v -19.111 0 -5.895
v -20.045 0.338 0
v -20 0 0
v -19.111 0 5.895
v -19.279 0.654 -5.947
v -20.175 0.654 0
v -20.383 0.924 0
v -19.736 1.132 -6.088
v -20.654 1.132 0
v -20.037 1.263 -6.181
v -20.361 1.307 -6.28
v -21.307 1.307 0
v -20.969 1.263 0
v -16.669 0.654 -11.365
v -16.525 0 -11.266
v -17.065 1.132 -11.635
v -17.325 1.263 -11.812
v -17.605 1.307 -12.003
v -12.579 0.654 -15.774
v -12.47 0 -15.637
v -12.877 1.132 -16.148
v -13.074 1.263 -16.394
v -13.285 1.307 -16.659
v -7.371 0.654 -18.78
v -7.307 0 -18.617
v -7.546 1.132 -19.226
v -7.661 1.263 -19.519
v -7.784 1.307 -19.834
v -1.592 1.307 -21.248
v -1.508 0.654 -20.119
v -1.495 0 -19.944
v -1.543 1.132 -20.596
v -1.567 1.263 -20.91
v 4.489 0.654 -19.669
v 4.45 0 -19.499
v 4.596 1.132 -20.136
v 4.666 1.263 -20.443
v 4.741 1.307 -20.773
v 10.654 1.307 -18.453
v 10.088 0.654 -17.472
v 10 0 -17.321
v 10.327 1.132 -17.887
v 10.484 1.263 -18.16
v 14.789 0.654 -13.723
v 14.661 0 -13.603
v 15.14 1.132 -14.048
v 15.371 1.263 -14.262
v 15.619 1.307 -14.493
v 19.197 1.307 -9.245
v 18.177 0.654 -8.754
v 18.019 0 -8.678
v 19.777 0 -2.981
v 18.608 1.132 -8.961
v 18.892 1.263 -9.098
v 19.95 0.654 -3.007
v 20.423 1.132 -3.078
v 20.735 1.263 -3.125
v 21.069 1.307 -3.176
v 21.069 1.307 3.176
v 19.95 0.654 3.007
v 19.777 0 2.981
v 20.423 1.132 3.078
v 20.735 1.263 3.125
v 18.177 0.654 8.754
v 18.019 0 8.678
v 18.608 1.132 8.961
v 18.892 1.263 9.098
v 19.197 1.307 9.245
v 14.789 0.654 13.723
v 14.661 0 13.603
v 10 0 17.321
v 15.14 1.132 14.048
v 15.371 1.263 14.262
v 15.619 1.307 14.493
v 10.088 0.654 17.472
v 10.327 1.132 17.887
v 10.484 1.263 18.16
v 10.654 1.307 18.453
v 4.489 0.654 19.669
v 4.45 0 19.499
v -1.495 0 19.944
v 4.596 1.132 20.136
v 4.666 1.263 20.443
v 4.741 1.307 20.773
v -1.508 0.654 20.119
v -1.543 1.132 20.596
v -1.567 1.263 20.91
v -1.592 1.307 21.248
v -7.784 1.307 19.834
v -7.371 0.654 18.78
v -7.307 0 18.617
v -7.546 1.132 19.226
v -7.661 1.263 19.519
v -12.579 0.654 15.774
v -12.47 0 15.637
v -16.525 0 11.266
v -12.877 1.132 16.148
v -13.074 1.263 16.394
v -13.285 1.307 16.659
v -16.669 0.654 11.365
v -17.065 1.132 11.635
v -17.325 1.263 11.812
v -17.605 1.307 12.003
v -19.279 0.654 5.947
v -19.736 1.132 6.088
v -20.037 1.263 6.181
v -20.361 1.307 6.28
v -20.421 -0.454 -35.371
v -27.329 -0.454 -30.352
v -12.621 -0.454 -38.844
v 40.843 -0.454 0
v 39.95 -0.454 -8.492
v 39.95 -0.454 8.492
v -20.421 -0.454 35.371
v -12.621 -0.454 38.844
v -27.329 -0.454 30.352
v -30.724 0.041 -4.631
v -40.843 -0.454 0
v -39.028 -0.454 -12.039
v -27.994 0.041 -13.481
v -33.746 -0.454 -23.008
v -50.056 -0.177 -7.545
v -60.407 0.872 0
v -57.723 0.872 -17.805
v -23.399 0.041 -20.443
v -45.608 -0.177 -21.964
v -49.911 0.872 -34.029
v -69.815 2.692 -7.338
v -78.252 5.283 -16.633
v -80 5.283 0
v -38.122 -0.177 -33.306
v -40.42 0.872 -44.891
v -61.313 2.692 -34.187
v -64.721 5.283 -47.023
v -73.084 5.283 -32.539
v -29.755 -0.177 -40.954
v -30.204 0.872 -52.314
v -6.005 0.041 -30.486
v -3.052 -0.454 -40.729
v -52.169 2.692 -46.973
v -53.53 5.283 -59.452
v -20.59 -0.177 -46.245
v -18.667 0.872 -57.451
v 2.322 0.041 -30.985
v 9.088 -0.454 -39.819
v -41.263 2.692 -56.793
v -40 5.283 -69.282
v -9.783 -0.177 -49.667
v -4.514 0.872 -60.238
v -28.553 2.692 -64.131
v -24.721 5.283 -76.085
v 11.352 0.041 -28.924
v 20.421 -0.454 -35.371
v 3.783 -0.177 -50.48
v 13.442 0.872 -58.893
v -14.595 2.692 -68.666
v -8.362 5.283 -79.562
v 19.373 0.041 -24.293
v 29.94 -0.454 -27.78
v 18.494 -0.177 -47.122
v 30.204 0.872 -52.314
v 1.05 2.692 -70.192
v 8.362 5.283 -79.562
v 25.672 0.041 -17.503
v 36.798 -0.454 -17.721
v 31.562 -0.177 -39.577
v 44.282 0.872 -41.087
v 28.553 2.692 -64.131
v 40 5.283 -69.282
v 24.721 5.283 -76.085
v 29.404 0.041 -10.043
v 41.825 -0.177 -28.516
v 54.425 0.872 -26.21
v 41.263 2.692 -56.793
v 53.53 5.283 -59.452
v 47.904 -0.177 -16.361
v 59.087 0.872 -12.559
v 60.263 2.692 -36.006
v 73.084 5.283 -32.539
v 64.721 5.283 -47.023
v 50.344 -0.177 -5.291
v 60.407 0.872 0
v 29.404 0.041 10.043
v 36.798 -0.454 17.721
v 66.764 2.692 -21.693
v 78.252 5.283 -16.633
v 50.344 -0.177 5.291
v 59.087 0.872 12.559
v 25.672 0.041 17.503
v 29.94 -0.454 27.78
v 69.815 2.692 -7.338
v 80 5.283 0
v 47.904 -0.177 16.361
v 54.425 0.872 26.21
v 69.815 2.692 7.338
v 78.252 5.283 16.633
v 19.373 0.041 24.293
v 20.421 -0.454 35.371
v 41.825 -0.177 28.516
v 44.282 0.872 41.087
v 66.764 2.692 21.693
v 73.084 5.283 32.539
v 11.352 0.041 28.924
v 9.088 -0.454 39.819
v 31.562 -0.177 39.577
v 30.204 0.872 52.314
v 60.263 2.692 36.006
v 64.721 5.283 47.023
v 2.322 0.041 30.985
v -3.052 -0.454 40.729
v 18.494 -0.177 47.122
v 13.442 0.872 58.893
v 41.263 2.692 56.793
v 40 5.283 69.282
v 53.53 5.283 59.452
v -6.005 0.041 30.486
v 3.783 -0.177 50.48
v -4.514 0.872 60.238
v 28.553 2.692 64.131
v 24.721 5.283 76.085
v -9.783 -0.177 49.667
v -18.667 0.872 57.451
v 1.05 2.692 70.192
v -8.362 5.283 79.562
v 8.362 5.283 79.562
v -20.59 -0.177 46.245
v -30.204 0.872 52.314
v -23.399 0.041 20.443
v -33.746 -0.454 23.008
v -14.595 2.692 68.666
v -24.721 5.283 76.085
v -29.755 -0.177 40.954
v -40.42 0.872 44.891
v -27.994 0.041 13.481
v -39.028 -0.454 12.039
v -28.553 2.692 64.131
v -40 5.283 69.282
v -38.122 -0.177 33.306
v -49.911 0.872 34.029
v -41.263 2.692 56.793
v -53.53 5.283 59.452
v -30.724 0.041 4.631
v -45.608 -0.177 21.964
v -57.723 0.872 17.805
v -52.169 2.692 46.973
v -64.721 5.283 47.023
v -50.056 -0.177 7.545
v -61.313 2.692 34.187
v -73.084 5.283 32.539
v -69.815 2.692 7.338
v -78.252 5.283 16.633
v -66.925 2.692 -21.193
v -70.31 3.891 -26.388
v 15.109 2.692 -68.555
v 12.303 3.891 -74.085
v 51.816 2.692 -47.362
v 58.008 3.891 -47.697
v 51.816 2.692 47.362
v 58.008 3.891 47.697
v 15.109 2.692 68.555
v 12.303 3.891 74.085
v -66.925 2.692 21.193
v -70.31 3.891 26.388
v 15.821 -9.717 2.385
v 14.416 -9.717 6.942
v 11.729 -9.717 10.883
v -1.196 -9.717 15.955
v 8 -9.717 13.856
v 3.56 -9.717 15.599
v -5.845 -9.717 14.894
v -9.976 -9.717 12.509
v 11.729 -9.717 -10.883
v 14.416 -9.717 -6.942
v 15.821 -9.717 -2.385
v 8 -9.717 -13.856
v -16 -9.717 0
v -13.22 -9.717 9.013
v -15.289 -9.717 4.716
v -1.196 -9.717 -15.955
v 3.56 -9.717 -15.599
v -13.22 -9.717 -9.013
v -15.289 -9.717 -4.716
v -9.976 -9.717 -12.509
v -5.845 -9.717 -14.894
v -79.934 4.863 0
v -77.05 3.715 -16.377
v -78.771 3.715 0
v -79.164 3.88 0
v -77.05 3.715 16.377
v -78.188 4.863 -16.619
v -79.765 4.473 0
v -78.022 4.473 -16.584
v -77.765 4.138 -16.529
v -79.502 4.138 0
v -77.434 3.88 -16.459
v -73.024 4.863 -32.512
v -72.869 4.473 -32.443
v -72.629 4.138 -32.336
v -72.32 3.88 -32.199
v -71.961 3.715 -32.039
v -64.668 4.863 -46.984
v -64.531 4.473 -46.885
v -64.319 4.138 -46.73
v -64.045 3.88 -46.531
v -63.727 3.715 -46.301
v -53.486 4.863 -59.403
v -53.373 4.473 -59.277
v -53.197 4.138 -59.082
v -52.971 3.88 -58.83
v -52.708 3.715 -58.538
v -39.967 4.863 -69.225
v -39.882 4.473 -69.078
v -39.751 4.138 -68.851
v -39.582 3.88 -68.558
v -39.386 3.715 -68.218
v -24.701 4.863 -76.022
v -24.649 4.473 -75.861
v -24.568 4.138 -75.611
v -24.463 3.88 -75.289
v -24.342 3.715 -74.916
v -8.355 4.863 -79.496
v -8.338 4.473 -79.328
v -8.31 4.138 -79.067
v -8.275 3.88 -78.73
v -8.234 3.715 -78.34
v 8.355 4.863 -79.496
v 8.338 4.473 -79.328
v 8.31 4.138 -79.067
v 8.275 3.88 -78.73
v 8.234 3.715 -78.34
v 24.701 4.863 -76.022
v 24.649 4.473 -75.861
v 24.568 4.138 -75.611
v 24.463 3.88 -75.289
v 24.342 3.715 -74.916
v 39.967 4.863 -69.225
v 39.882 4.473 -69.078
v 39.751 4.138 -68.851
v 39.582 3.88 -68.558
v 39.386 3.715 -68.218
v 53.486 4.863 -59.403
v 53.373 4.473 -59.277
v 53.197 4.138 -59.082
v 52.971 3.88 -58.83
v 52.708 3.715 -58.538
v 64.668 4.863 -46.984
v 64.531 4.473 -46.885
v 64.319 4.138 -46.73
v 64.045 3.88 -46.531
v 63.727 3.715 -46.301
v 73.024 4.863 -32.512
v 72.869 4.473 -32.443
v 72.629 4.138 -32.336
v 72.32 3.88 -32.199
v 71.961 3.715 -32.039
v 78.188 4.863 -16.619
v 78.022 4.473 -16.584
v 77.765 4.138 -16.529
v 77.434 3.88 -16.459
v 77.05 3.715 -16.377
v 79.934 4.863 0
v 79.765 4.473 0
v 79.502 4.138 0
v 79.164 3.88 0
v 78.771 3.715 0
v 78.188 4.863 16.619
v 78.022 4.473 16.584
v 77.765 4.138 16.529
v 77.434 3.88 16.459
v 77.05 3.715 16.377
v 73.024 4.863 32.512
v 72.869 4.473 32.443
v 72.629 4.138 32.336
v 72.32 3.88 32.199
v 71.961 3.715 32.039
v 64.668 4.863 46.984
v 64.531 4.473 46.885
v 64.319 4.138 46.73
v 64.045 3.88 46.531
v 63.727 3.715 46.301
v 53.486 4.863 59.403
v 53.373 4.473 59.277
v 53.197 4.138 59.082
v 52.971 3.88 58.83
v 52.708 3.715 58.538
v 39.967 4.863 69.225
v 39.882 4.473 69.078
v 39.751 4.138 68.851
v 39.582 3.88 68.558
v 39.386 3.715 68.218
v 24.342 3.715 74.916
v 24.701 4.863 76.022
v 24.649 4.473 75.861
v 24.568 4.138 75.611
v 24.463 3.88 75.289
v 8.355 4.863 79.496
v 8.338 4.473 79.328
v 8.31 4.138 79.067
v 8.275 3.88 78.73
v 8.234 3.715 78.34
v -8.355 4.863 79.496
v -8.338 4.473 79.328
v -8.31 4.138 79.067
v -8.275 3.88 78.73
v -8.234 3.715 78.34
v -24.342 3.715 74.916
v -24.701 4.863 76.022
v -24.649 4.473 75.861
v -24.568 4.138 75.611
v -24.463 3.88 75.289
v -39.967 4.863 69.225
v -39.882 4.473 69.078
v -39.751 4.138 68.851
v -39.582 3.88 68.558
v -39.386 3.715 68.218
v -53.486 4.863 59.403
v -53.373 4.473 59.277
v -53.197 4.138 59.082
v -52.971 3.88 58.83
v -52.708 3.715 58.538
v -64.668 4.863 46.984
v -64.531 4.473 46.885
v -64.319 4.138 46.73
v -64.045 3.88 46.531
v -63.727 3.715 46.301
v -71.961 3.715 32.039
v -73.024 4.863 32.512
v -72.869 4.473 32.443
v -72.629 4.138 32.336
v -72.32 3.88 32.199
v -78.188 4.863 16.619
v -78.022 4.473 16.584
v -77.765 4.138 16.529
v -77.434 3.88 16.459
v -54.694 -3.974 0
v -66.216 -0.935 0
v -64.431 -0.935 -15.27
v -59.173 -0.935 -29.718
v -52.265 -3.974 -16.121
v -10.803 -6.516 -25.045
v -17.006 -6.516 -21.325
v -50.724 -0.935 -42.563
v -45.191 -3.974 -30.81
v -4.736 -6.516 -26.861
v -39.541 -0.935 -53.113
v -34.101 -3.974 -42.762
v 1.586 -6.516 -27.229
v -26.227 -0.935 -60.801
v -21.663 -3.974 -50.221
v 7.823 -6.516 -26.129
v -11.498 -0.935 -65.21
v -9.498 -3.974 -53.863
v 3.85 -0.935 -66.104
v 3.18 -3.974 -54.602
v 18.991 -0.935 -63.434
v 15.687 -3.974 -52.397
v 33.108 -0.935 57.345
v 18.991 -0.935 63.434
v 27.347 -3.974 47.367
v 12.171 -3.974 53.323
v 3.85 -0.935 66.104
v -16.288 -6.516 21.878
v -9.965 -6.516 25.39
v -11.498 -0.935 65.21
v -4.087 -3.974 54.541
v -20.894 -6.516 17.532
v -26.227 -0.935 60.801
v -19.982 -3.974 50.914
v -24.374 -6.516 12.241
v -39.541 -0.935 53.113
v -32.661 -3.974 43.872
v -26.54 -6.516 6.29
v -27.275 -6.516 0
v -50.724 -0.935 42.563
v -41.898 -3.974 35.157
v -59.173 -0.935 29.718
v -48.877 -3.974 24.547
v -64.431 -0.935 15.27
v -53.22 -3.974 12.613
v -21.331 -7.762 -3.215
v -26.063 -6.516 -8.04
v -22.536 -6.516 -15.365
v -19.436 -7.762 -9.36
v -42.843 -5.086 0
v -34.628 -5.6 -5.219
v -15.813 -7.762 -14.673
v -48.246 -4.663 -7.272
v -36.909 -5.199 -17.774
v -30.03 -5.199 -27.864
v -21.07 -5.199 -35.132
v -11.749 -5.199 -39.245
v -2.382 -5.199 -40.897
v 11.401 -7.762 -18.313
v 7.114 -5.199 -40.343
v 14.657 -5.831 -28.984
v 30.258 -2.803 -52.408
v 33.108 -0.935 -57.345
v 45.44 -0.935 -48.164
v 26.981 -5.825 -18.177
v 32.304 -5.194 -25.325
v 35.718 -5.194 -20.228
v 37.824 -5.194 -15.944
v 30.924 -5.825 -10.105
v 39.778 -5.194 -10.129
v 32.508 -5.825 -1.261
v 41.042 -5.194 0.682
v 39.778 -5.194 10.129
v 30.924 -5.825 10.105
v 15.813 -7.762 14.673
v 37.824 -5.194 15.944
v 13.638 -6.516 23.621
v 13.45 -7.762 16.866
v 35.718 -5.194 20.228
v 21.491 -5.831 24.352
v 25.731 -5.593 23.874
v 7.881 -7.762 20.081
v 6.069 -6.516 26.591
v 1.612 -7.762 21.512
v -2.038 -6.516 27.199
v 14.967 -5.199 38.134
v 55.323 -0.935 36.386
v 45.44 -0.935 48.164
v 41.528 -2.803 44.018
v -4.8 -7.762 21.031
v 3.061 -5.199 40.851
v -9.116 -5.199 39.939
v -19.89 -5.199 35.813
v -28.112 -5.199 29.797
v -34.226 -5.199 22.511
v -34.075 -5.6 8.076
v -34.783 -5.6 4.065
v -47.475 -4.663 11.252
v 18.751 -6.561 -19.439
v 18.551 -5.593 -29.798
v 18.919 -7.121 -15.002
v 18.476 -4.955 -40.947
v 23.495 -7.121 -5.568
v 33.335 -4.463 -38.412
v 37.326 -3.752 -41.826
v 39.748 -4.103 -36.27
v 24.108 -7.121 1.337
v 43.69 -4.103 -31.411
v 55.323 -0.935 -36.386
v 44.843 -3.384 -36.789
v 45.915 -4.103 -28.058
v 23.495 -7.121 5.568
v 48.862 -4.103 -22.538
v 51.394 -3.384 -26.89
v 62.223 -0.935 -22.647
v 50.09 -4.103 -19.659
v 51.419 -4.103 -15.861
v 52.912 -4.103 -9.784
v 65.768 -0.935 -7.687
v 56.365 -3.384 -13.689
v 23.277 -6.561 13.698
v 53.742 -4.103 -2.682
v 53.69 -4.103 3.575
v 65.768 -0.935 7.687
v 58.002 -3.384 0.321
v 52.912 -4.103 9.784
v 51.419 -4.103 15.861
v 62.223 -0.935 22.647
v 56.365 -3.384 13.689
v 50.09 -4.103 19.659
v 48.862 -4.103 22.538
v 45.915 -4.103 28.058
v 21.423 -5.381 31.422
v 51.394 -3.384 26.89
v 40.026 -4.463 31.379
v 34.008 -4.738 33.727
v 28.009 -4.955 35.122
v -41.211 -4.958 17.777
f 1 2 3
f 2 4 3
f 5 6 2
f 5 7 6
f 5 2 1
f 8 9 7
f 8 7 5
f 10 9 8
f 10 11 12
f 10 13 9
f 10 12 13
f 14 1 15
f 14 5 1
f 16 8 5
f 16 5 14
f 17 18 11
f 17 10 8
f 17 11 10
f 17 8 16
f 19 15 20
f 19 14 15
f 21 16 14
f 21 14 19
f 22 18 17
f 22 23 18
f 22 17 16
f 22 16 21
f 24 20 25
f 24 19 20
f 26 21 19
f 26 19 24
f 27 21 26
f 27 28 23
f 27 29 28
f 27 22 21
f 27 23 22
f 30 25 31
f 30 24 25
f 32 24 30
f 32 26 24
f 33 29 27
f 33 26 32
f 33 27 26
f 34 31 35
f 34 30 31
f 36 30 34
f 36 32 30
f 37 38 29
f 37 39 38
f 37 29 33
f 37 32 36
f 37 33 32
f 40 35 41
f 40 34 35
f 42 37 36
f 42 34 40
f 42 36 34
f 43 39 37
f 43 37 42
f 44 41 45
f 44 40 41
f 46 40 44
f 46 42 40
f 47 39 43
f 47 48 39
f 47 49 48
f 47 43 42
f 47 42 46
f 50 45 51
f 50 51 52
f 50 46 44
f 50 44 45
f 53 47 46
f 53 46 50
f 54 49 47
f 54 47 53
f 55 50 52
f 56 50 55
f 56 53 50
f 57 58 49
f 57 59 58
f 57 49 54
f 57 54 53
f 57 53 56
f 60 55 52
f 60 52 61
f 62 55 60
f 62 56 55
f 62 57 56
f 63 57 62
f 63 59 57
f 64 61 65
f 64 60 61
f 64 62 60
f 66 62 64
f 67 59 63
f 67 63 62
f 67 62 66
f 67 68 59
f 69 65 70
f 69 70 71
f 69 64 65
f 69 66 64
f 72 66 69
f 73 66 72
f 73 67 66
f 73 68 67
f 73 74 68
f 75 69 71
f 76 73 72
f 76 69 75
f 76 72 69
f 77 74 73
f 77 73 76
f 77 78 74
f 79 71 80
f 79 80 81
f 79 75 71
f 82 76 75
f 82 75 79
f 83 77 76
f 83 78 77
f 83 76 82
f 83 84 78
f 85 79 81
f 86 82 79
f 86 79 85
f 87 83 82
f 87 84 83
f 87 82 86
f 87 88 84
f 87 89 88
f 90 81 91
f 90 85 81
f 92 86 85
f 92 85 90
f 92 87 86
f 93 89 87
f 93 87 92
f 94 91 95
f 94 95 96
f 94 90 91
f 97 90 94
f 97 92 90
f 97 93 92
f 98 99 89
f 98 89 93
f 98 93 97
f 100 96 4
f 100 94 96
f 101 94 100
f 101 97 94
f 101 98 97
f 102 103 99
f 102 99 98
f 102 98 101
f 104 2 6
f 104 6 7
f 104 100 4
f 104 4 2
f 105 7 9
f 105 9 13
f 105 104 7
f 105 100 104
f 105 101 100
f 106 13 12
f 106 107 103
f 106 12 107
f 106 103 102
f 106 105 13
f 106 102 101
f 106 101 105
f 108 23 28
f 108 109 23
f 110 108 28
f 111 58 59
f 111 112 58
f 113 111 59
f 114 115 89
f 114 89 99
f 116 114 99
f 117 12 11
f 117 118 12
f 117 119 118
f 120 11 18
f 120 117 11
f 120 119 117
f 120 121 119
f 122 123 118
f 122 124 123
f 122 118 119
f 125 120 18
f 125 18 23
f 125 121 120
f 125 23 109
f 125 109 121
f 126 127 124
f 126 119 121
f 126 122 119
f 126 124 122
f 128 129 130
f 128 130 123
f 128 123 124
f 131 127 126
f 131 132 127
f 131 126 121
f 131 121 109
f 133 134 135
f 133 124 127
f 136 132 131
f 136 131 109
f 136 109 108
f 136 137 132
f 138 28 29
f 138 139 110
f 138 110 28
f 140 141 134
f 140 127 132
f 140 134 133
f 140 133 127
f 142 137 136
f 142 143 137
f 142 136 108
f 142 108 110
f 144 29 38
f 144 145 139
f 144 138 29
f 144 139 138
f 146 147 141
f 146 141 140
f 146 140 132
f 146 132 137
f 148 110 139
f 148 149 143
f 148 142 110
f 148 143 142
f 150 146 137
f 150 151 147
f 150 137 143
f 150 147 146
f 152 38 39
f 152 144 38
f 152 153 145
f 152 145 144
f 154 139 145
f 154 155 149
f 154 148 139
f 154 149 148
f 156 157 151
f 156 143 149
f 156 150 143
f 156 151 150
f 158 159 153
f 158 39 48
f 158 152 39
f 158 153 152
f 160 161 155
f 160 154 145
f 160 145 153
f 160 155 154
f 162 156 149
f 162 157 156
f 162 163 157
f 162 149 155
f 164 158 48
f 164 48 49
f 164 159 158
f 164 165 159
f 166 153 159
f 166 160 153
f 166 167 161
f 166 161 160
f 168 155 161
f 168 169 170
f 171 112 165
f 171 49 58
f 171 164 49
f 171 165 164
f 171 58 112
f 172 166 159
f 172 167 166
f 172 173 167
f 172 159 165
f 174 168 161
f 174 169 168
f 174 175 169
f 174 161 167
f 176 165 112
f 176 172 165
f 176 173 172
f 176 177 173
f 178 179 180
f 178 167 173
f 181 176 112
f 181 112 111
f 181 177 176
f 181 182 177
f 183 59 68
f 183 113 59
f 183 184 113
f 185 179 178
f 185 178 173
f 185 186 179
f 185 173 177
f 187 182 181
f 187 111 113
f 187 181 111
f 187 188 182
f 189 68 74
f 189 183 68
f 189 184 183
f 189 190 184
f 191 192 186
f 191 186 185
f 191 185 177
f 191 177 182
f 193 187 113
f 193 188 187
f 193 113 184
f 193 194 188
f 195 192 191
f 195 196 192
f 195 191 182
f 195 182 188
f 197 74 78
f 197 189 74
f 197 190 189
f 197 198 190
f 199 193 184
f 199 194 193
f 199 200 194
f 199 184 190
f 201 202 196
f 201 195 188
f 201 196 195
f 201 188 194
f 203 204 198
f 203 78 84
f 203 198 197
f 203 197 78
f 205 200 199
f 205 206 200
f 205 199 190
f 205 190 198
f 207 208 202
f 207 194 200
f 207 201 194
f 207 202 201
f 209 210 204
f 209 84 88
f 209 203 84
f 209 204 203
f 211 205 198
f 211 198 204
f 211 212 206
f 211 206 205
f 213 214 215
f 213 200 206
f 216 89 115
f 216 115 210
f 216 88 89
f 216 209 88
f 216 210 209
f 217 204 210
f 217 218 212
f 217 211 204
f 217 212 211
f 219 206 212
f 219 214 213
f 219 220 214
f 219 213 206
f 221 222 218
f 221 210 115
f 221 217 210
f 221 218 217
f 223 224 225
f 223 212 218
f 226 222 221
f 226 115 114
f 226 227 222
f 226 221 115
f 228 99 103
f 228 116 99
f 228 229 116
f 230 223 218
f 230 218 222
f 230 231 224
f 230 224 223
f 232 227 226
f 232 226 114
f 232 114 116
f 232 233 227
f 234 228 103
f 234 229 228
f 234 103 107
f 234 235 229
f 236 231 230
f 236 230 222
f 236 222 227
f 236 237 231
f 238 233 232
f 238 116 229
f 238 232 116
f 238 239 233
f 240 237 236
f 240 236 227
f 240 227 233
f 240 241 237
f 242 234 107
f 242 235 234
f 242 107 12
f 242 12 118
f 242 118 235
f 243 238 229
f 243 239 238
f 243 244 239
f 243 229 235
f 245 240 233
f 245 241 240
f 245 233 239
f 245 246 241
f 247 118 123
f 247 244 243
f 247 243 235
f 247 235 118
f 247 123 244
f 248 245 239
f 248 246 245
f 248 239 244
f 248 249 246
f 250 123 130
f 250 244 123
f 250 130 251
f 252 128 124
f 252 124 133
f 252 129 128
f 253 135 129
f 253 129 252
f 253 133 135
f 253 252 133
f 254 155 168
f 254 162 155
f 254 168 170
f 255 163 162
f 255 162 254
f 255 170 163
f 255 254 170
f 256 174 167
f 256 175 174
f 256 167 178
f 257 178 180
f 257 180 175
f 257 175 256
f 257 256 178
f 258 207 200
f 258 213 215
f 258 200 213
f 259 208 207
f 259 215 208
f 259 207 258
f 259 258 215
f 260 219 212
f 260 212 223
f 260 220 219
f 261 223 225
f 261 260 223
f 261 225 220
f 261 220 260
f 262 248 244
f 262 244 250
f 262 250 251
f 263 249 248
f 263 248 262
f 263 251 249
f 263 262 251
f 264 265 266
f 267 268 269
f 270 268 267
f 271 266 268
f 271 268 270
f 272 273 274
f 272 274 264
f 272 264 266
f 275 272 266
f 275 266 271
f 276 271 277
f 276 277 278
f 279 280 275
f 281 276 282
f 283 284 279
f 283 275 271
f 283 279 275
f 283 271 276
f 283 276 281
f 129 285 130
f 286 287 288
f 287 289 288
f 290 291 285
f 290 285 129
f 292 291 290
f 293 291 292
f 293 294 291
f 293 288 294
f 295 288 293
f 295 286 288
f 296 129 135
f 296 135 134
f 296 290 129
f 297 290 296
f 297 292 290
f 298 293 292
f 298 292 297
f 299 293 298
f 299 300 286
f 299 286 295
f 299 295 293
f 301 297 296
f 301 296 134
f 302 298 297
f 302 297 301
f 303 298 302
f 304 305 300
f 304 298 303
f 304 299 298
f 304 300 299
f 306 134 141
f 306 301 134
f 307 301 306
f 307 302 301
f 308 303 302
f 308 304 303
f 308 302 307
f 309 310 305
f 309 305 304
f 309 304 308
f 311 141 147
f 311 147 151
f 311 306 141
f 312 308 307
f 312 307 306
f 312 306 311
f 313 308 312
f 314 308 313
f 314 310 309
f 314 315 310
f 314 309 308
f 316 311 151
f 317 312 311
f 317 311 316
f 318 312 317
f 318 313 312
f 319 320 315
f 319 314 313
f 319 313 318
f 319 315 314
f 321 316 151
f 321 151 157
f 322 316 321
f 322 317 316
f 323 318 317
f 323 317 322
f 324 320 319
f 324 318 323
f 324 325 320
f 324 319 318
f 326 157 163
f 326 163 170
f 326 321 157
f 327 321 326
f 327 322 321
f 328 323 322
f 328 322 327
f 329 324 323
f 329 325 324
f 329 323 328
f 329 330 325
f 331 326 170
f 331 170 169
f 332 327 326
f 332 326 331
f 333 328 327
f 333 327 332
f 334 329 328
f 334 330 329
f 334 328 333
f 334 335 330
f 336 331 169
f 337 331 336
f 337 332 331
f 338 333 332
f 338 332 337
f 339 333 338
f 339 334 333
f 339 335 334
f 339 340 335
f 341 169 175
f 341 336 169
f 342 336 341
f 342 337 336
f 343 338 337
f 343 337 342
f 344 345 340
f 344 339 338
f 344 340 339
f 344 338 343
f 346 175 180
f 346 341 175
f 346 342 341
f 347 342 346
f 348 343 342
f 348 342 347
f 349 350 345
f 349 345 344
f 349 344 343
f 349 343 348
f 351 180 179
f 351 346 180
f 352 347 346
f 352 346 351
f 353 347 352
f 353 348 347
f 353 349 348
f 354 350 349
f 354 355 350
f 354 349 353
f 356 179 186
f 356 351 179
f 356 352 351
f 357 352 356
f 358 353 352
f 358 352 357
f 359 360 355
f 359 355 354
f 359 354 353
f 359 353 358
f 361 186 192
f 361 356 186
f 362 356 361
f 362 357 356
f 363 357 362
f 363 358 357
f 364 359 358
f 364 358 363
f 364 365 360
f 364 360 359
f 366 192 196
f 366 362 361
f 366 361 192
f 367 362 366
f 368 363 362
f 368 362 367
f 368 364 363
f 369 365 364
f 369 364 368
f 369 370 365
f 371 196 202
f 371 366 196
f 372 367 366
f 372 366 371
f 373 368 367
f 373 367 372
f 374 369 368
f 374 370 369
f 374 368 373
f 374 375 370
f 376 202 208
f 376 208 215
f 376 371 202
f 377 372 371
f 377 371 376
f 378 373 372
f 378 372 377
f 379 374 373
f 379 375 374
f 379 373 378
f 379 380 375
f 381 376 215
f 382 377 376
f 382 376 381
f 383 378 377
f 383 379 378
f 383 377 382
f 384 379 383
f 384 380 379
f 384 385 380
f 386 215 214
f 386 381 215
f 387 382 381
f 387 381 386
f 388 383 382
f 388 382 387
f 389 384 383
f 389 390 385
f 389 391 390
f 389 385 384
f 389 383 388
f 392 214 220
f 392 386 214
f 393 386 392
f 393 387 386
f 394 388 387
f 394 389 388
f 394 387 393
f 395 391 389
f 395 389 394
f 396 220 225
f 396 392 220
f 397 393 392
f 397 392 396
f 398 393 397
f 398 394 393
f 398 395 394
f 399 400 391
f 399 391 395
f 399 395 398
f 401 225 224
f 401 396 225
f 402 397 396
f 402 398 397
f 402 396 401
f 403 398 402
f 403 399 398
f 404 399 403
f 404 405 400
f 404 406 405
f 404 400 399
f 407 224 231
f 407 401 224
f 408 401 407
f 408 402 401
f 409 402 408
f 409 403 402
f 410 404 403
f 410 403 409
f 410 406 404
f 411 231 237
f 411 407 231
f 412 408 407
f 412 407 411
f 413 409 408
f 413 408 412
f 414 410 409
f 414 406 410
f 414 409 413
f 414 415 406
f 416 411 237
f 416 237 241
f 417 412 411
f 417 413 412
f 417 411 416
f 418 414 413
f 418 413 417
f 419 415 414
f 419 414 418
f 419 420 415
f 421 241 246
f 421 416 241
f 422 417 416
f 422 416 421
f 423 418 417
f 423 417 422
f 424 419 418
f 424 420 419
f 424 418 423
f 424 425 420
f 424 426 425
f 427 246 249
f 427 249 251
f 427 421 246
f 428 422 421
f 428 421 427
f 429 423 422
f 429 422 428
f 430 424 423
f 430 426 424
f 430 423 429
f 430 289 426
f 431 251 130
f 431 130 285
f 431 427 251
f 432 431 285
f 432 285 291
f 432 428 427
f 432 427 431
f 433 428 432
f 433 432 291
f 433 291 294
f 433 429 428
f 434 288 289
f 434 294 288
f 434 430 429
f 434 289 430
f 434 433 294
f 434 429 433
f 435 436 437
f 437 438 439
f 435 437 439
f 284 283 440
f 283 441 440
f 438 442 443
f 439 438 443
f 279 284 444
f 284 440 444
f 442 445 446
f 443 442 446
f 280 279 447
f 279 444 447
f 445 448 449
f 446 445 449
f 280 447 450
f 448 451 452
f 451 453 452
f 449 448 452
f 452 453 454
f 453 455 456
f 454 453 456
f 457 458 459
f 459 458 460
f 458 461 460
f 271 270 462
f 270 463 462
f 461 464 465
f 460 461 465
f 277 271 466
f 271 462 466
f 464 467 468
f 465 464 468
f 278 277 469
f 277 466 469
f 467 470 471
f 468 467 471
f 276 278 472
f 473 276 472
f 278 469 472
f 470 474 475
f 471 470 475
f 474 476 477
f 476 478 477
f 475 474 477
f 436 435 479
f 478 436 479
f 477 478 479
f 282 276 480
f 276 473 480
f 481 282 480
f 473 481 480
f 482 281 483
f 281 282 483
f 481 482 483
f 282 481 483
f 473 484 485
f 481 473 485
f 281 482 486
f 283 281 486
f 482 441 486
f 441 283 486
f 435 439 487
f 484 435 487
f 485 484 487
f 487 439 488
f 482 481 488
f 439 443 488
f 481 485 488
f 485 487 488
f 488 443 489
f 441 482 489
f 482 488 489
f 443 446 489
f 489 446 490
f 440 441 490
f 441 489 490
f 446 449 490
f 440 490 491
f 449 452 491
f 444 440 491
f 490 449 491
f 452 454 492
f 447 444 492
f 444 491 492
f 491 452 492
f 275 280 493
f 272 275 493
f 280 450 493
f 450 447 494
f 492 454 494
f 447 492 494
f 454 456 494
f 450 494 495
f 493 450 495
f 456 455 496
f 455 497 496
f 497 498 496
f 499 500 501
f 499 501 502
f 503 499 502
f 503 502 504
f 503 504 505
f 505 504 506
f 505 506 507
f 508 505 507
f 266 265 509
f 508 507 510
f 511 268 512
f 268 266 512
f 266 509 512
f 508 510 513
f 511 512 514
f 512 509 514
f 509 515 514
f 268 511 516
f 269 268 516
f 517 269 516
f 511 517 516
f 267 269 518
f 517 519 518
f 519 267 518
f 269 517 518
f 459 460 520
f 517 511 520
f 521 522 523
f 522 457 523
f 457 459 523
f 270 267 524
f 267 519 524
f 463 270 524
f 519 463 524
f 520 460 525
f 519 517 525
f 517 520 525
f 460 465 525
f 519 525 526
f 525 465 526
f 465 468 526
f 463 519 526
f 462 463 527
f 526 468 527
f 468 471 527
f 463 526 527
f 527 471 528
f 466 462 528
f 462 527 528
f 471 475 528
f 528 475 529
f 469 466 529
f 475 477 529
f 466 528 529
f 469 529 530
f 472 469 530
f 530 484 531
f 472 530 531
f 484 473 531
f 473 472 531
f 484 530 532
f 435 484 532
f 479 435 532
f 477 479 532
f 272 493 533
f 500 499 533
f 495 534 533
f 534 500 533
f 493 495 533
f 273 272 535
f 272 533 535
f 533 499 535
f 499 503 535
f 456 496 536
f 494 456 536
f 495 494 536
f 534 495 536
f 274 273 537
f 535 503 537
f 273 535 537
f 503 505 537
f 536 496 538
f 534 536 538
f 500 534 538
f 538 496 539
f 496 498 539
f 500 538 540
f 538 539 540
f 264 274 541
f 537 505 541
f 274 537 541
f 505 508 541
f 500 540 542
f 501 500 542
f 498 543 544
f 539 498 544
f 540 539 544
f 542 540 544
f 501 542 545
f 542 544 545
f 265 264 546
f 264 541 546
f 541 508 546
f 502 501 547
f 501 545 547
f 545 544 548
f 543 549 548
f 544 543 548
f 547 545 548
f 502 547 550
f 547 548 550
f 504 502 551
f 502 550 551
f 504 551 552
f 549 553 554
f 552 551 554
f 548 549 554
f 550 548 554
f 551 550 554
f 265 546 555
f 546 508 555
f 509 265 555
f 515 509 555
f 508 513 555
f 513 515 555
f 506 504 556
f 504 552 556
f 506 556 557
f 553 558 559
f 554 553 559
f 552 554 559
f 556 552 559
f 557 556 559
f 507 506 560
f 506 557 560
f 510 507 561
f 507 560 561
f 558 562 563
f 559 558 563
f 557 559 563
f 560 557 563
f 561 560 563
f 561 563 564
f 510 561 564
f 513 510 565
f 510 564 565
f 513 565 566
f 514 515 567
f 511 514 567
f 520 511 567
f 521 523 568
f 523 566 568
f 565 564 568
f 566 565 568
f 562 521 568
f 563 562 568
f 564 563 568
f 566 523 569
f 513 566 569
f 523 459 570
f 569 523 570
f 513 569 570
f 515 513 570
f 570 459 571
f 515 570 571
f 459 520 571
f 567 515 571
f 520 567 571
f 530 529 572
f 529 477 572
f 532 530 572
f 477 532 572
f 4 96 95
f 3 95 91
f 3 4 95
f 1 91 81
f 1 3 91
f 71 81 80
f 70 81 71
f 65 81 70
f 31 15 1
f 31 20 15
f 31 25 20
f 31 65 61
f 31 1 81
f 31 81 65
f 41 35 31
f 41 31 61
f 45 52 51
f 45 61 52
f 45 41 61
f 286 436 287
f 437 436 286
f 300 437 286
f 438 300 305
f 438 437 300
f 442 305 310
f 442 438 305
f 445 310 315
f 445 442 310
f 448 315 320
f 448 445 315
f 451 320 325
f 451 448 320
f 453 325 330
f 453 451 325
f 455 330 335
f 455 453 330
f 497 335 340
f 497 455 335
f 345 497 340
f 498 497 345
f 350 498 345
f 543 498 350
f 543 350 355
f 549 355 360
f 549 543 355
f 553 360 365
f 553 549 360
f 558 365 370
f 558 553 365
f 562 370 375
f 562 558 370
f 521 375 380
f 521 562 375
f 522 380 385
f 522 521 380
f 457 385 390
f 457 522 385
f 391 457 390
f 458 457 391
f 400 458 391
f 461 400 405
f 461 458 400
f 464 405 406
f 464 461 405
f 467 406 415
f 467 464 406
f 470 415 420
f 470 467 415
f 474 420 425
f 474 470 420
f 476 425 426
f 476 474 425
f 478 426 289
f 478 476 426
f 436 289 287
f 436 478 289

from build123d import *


with BuildPart() as part:
    # Sketch2 → Revolve2 (revolve)
    with BuildSketch(Plane.XY, mode=Mode.PRIVATE) as revolve2_sk:
        with BuildLine():
            Line((0, 0), (20, 0))
            ThreePointArc((20, 0), (20.382866953, 0.92432259), (21.307189542, 1.307189542))
            add(Edge.make_bspline(
                [(21.307189542, 1.307189542), (50.589297326, -3.648702918), (80, 5.283333405)],
                knots=[0, 0, 0, 1, 1, 1], degree=2))
            ThreePointArc((80, 5.283333405), (79.644135668, 4.296719594), (78.771253816, 3.715235711))
            Line((78.771253816, 3.715235711), (66.216017581, -0.934527379))
            add(Edge.make_bspline(
                [(16, -9.716666595), (31.973399001, -2.802481332), (50.081212283, -7.497100863), (66.216017581, -0.934527379)],
                knots=[0, 0, 0, 0, 1, 1, 1, 1], degree=3))
            Line((16, -9.716666595), (0, -9.716666595))
            Line((0, -9.716666595), (0, 0))
        make_face()
    revolve(revolve2_sk.sketch.rotate(Axis((0, 0, 0), (0, -1, 0)), 180), axis=Axis((0, 0, 0), (0, -1, 0)))


solid = part.part
